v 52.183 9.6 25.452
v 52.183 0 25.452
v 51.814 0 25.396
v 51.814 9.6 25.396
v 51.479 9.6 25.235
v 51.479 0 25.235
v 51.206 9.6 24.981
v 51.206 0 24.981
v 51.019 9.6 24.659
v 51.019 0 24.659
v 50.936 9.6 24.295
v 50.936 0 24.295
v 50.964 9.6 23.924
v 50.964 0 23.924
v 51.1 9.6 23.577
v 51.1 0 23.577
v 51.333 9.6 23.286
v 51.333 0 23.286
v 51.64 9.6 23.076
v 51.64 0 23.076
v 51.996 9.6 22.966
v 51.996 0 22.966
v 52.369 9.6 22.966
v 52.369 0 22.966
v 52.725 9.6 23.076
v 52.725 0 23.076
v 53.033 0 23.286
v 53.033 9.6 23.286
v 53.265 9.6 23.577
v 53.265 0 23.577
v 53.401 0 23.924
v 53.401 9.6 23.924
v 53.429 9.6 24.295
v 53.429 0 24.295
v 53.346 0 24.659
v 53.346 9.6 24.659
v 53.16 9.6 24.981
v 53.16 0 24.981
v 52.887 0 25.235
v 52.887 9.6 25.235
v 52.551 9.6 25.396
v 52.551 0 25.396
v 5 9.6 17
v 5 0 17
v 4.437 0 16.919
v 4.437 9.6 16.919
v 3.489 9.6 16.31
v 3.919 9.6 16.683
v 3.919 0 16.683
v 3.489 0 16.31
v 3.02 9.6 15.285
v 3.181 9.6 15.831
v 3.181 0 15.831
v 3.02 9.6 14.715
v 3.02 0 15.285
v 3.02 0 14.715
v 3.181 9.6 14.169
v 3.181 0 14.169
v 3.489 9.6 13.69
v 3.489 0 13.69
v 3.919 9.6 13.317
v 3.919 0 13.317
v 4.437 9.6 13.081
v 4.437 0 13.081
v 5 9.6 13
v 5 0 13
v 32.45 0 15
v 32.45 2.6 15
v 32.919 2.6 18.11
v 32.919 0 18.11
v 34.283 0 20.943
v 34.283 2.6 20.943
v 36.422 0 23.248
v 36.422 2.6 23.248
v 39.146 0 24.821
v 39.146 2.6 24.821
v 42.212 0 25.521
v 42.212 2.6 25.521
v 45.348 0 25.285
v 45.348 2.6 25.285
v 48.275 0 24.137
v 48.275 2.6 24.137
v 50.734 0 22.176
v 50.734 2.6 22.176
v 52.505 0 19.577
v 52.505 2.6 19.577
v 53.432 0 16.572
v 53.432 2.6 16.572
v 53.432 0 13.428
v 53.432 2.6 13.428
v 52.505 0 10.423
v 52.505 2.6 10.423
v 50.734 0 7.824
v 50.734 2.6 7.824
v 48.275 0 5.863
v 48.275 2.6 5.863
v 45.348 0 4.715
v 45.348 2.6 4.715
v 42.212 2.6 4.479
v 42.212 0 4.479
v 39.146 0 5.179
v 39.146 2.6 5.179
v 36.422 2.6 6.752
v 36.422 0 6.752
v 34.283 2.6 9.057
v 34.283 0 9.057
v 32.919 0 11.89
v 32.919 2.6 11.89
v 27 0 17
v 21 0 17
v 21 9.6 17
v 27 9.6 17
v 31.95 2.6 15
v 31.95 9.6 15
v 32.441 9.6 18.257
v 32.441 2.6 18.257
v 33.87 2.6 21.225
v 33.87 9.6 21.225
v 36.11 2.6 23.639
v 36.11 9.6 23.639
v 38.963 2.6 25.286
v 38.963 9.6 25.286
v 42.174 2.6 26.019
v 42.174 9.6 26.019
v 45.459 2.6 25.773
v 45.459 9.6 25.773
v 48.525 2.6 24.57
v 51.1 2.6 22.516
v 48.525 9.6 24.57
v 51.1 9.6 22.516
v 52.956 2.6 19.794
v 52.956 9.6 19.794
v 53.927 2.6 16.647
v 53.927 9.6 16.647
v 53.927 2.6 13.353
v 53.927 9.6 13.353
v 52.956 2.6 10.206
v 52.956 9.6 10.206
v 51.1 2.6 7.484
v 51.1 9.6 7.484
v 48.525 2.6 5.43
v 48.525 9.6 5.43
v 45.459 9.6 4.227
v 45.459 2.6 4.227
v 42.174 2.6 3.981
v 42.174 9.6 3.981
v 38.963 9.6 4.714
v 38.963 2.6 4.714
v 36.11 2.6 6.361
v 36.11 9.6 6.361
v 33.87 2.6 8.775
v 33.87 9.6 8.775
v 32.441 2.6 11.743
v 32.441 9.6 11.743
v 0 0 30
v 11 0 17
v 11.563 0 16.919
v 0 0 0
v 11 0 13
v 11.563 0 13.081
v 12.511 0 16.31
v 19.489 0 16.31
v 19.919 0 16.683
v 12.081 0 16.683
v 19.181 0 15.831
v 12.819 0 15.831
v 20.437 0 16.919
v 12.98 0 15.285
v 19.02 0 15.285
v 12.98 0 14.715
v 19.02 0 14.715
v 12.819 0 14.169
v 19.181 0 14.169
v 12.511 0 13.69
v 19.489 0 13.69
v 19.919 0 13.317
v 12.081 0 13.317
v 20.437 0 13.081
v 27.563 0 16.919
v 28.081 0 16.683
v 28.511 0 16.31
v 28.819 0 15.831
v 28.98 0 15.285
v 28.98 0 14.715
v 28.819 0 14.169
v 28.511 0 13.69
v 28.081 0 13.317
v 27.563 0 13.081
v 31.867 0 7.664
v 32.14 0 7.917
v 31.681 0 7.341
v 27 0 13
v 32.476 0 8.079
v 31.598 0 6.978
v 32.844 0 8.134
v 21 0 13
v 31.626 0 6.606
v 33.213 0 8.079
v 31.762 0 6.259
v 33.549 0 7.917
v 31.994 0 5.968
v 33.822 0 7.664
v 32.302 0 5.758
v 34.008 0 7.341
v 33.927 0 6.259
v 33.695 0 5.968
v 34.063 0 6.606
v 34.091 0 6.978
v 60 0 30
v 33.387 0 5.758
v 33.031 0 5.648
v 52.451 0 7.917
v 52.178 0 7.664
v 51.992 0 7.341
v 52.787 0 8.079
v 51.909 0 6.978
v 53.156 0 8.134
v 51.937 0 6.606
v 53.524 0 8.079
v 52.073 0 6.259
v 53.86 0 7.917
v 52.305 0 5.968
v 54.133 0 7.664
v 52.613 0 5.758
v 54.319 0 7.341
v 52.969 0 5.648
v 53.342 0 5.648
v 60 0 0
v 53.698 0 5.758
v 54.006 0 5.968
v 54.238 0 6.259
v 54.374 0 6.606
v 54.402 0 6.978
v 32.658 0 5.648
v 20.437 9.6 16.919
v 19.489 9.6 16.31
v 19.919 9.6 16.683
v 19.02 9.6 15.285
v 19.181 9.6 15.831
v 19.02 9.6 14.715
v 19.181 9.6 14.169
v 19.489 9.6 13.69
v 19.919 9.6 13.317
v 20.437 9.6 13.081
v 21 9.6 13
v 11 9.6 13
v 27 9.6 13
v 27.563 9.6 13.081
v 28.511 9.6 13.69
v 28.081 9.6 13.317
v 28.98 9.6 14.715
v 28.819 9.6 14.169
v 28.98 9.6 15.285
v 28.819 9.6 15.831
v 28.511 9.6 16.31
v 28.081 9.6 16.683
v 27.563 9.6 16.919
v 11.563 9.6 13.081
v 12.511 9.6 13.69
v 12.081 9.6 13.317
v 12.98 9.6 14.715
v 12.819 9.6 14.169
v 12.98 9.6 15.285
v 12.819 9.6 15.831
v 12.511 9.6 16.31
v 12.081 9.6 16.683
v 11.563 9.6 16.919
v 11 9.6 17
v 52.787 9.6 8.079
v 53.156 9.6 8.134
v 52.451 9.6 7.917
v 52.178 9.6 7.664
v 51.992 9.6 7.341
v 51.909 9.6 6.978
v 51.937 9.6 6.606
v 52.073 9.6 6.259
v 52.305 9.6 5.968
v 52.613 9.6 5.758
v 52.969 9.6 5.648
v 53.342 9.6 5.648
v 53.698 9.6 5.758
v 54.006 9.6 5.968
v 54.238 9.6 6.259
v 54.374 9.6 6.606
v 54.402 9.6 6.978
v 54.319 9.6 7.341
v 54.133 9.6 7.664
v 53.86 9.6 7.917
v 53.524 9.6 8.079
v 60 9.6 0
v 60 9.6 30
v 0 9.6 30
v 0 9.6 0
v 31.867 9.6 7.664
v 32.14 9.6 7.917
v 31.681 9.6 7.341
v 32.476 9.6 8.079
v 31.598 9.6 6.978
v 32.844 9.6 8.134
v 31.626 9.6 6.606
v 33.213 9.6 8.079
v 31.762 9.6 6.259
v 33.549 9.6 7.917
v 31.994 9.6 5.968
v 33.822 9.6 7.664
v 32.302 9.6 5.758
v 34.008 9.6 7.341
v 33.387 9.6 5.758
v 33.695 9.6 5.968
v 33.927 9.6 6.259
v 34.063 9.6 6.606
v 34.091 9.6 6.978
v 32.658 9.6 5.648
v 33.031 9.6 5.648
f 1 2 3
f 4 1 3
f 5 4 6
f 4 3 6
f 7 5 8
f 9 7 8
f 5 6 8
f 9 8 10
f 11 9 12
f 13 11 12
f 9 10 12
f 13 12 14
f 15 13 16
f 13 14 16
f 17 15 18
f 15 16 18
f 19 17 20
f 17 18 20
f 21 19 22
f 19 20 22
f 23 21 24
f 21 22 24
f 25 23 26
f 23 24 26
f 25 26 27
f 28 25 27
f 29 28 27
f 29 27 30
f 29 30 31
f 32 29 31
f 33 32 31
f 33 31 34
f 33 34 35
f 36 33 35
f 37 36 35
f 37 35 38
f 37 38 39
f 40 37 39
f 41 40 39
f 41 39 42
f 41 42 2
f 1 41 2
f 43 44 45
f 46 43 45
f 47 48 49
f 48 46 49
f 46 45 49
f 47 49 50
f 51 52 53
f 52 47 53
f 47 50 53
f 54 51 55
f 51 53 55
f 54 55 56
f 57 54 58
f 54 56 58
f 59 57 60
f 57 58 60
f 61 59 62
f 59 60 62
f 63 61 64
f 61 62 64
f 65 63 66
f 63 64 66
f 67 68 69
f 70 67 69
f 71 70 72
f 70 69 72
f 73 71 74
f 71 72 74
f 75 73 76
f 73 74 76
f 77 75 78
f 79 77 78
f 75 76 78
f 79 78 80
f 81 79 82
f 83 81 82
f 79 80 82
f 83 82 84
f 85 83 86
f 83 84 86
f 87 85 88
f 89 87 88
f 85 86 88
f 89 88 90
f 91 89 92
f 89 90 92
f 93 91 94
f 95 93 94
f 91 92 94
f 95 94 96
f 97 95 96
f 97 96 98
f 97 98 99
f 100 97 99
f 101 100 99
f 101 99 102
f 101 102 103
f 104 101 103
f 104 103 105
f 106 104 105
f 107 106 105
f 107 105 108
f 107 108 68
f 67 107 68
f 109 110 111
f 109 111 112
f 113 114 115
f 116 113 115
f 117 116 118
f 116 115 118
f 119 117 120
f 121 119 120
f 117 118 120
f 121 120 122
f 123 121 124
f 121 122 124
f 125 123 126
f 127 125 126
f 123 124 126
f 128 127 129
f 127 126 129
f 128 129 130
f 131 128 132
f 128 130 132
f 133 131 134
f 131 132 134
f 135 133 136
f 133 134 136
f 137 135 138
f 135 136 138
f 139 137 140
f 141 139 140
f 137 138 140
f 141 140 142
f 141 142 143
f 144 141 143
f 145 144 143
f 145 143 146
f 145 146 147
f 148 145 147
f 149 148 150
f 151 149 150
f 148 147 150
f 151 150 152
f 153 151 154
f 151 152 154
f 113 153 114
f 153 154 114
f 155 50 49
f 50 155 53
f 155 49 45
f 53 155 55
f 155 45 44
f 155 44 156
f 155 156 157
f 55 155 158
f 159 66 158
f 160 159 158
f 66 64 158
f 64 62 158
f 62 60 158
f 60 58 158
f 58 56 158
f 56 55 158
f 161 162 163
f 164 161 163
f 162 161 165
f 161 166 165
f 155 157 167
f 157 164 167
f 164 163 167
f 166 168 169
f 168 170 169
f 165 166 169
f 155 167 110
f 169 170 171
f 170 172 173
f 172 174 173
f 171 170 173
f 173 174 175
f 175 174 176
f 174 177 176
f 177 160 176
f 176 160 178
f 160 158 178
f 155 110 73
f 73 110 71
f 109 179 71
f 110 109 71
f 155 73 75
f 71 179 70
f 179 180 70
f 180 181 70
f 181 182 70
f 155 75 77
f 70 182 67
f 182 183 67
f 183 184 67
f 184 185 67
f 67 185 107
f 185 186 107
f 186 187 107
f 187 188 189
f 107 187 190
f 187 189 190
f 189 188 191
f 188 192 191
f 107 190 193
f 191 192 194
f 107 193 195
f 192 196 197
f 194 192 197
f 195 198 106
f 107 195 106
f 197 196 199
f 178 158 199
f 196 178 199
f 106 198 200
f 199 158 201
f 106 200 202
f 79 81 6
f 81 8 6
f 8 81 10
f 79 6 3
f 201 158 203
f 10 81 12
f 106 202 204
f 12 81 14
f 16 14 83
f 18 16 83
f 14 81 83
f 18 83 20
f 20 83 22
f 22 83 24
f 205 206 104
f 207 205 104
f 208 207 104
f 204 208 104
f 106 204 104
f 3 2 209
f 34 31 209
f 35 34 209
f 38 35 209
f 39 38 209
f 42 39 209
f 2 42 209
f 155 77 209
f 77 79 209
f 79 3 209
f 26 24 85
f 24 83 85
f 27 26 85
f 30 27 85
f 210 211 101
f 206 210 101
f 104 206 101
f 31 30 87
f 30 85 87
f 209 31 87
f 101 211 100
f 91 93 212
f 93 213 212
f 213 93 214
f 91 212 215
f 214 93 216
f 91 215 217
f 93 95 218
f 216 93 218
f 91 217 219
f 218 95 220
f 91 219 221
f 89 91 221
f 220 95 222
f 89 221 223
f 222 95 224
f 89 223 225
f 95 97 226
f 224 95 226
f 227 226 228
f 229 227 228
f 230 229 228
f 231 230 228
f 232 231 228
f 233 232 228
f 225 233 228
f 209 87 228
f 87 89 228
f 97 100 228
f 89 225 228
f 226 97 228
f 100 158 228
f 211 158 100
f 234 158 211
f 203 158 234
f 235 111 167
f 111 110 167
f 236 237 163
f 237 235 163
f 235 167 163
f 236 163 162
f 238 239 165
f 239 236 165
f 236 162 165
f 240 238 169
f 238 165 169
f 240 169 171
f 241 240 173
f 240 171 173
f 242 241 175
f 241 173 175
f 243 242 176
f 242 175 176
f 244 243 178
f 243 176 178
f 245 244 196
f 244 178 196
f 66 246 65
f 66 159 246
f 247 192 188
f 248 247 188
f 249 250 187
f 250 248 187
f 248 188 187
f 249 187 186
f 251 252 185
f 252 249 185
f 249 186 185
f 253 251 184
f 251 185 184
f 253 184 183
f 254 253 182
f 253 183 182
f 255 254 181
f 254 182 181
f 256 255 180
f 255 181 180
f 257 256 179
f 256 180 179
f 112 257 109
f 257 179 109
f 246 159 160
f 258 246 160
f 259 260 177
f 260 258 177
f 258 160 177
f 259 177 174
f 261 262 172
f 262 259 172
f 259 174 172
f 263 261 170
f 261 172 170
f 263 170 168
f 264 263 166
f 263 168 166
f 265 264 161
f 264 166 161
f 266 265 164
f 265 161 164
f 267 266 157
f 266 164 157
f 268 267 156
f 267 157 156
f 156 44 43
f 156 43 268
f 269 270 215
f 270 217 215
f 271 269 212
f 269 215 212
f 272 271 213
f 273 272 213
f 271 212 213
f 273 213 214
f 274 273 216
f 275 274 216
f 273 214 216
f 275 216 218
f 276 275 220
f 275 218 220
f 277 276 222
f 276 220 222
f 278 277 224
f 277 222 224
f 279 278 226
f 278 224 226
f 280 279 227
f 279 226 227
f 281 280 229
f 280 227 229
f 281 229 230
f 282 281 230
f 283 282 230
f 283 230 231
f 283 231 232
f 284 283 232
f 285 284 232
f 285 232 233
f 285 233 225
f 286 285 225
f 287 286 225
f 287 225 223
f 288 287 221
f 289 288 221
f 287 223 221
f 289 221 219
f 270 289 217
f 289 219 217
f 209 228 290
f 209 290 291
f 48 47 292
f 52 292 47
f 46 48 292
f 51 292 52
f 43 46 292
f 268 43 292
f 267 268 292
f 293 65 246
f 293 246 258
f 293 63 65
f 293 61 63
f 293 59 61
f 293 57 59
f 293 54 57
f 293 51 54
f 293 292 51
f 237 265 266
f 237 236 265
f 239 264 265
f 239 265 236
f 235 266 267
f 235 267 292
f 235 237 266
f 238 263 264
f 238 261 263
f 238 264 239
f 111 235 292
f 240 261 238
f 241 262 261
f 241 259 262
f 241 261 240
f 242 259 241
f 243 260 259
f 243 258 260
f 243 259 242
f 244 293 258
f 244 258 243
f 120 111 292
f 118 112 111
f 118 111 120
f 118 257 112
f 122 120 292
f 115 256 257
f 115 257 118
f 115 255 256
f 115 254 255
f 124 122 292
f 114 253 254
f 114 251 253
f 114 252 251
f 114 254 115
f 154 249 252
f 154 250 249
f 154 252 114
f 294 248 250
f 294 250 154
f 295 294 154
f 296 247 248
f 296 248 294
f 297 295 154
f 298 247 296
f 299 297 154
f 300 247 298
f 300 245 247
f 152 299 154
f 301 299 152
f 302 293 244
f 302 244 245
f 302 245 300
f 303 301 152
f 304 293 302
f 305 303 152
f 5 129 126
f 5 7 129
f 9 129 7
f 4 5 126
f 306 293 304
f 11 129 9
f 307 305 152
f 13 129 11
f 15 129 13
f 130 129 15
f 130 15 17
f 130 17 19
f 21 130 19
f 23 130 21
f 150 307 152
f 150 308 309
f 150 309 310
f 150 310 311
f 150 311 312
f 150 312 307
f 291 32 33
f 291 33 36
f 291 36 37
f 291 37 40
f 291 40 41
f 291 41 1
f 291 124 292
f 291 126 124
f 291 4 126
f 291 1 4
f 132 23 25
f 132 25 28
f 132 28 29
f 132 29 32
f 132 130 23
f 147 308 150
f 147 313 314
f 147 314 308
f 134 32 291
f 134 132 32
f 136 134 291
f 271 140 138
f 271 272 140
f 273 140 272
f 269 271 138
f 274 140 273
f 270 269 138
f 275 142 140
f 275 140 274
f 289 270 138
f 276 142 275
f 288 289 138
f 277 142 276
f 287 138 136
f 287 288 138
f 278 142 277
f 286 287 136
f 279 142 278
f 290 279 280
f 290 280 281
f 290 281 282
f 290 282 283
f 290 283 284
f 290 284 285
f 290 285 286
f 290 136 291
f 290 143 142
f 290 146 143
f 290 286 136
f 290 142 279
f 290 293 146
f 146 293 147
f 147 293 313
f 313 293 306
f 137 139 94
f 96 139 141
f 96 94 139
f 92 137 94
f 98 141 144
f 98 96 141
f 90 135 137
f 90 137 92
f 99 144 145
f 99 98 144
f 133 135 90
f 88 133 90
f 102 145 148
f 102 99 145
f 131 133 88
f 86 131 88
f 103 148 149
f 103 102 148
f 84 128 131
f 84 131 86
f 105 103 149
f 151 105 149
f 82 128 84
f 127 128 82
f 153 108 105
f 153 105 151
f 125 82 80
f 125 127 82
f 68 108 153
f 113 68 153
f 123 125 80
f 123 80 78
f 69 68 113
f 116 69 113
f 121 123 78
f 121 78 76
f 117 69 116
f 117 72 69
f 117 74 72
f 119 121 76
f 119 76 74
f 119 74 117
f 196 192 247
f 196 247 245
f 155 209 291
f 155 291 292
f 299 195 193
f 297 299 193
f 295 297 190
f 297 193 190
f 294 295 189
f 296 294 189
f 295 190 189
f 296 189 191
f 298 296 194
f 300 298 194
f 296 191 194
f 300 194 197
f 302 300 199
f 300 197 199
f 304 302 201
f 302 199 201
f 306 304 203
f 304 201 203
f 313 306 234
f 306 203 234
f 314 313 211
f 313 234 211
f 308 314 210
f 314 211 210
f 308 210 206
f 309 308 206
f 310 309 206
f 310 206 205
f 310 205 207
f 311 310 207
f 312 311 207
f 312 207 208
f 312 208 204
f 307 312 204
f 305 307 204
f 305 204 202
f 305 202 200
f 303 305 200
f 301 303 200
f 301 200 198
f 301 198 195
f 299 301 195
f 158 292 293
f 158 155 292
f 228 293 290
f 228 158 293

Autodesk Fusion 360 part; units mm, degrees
sketch "Sketch1" plane through (0, 0, 0) normal (0, 1, 0) x (1, 0, 0)
  line L0 (0, 0) -> (60, 0)
  line L1 (60, 0) -> (60, -30)
  line L2 (60, -30) -> (0, -30)
  line L3 (0, -30) -> (0, 0)
  line L4 (0, -15) -> (60, -15) construction
  line L5 (8, 0) -> (8, -30) construction
  line L6 (24, 0) -> (24, -30) construction
  line L7 (11, -13) -> (5, -13)
  arc A0 (5, -13) -> (5, -17) centre (5, -15) ccw
  line L8 (5, -17) -> (11, -17)
  arc A1 (11, -17) -> (11, -13) centre (11, -15) ccw
  line L9 (11, -15) -> (5, -15) construction
  line L10 (21, -17) -> (27, -17)
  arc A2 (27, -17) -> (27, -13) centre (27, -15) ccw
  line L11 (27, -13) -> (21, -13)
  arc A3 (21, -13) -> (21, -17) centre (21, -15) ccw
  line L12 (21, -15) -> (27, -15) construction
  line L13 (43, 0) -> (43, -30) construction
  point P0 (11, -15)
  point P1 (5, -15)
  point P2 (21, -15)
  point P3 (27, -15)
  dimension "d1" = 60
  dimension "d2" = 30
  dimension "d3" = 8
  dimension "d4" = 16
  dimension "d5" = 3
  dimension "d6" = 3
  dimension "d7" = 3
  dimension "d8" = 3
  dimension "d9" = 4
  dimension "d10" = 4
  dimension "d13" = 43
extrude "Extrude1" add sketch "Sketch1" along normal blind 9.6
sketch "Sketch2" plane through (0, 9.6, 0) normal (0, 1, 0) x (-1, 0, 0)
  arc A0 (-21, 13) -> (-21, 17) centre (-21, 15) ccw
  line L0 (-21, 13) -> (-27, 13)
  arc A1 (-27, 17) -> (-27, 13) centre (-27, 15) ccw
  line L1 (-27, 17) -> (-21, 17)
  arc A2 (-11, 17) -> (-11, 13) centre (-11, 15) ccw
  line L2 (-11, 17) -> (-5, 17)
  arc A3 (-5, 13) -> (-5, 17) centre (-5, 15) ccw
  line L3 (-5, 13) -> (-11, 13)
  line L4 (0, 30) -> (-60, 30)
  line L5 (-60, 30) -> (-60, 0)
  line L6 (-60, 0) -> (0, 0)
  line L7 (0, 0) -> (0, 30)
  circle A4 centre (-43, 15) radius 11.05
  circle A5 centre (-43, 15) radius 10.55
  dimension "d15" = 22.1
  dimension "d16" = 21.1
extrude "Extrude2" cut sketch "Sketch2" against normal blind 7 contours A4
extrude "Extrude3" cut 1 faces at (40.0944, 9.6, 14.0673) along direction (0, 1, 0) through all and the other way through all
sketch "Sketch3" plane through (0, 9.6, 0) normal (0, 1, 0) x (-1, 0, 0)
  line L0 (0, 30) -> (-60, 30)
  line L1 (-60, 30) -> (-60, 0)
  line L2 (-60, 0) -> (0, 0)
  line L3 (0, 0) -> (0, 30)
  arc A0 (-21, 13) -> (-21, 17) centre (-21, 15) ccw
  line L4 (-21, 13) -> (-27, 13)
  arc A1 (-27, 17) -> (-27, 13) centre (-27, 15) ccw
  line L5 (-27, 17) -> (-21, 17)
  arc A2 (-11, 17) -> (-11, 13) centre (-11, 15) ccw
  line L6 (-11, 17) -> (-5, 17)
  arc A3 (-5, 13) -> (-5, 17) centre (-5, 15) ccw
  line L7 (-5, 13) -> (-11, 13)
  circle A4 centre (-43, 15) radius 11.05
  circle A5 centre (-43, 15) radius 13 construction
  point P0 (-32.8444, 6.8844)
  point P1 (-52.1828, 24.202)
  point P2 (-53.1556, 6.8844)
  dimension "d30" = 26
hole "Hole1" at (32.8444, 9.6, 6.8844) direction (0, -1, 0) diameter 2.5 end through all
hole "Hole2" at (53.1556, 9.6, 6.8844) direction (0, -1, 0) diameter 2.5 end through all
hole "Hole3" at (52.1828, 9.6, 24.202) direction (0, -1, 0) diameter 2.5 end through all
